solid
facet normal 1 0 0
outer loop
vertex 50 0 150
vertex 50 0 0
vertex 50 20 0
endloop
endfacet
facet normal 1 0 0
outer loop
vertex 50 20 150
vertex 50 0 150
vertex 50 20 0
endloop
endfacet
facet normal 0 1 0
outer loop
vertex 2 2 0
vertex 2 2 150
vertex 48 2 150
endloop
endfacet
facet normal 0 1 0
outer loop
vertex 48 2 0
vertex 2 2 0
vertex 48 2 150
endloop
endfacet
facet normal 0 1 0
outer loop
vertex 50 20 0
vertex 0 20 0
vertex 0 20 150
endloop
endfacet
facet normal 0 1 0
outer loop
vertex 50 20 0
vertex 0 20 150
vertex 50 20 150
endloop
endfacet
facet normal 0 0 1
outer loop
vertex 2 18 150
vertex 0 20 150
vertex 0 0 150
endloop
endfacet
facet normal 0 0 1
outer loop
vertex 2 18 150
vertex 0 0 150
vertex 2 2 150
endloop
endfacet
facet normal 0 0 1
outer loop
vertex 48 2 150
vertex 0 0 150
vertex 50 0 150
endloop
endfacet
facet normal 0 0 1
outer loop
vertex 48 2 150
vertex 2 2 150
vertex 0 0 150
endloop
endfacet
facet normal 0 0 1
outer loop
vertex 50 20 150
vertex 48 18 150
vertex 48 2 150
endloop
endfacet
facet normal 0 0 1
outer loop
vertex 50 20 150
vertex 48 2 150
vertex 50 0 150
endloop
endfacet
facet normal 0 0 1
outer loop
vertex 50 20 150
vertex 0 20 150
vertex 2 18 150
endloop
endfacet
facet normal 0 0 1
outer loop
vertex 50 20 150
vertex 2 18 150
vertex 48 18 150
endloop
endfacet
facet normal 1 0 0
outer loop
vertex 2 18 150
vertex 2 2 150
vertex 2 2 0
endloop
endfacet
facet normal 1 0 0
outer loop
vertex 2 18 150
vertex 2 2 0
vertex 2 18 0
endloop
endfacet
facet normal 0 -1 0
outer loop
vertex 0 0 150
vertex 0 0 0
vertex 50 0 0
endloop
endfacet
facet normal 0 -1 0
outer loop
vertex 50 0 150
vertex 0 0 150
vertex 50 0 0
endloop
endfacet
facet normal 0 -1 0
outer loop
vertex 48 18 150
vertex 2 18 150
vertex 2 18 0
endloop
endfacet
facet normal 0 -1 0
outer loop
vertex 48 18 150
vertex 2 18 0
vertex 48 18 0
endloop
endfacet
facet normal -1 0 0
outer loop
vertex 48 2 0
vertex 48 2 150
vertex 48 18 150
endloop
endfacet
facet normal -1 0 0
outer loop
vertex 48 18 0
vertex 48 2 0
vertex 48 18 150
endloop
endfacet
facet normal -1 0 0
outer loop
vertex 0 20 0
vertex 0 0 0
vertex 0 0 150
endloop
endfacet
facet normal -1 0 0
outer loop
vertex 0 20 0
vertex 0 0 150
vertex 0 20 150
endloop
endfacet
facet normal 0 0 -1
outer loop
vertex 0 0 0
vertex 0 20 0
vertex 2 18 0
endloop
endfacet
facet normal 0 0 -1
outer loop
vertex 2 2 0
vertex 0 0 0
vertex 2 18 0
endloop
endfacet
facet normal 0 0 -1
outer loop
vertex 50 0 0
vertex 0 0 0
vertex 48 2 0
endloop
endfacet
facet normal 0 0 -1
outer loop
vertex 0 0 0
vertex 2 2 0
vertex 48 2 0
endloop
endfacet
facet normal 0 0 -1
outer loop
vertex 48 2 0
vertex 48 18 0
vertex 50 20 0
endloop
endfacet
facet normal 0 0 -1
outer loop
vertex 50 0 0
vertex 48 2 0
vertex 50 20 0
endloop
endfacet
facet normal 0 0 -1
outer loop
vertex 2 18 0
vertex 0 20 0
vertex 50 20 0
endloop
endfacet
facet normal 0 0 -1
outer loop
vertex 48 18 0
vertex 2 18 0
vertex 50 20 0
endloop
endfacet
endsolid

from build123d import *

# Parameters (mm, degrees)
SKICA1_W                = 50
SKICA1_H                = 20
P_IDAT_VYSUNUT_M1_DEPTH = 150
SKO_EPINA1_T            = -2


with BuildPart() as part:
    # Skica1 → Přidat vysunutím1 (new body)
    with BuildSketch(Plane.XY):
        with Locations((25, 10)):
            Rectangle(SKICA1_W, SKICA1_H)
    extrude(amount=P_IDAT_VYSUNUT_M1_DEPTH)

    # Skořepina1
    sko_epina1_openings = [part.faces().sort_by_distance(p)[0] for p in [
        (25, 10, 150),
        (25, 10, 0),
    ]]
    offset(amount=SKO_EPINA1_T, openings=sko_epina1_openings, kind=Kind.INTERSECTION)


solid = part.part
